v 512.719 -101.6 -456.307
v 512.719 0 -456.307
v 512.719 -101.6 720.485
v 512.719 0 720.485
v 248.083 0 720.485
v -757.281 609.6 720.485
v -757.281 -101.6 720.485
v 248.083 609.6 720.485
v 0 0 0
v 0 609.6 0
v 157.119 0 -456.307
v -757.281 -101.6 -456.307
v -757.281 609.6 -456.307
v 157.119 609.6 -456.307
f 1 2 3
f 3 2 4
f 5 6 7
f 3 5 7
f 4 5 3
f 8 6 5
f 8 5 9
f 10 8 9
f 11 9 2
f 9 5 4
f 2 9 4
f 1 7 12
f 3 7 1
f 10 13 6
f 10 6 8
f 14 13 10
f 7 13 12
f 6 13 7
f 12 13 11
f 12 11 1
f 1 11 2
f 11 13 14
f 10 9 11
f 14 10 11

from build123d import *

# Parameters (mm, degrees)
BOSS_EXTRUDE1_DEPTH = 609.6
SKETCH2_W           = 1270
SKETCH2_H           = 1176.792419191
BOSS_EXTRUDE2_DEPTH = 101.6


with BuildPart() as part:
    # Sketch1 → Boss-Extrude1 (new body)
    with BuildSketch(Plane(origin=(0, 0, 0), x_dir=(1, 0, 0), z_dir=(0, 1, 0))):
        Polygon((0, 0), (157.119191341, 456.307264584), (-757.280808659, 456.307264584), (-757.280808659, -720.485154607), (248.082933696, -720.485154607), align=None)
    extrude(amount=BOSS_EXTRUDE1_DEPTH)

    # Sketch2 → Boss-Extrude2 (add)
    with BuildSketch(Plane.XZ):
        with Locations((-122.280808659, 132.088945011)):
            Rectangle(SKETCH2_W, SKETCH2_H)
    extrude(amount=BOSS_EXTRUDE2_DEPTH)


solid = part.part
